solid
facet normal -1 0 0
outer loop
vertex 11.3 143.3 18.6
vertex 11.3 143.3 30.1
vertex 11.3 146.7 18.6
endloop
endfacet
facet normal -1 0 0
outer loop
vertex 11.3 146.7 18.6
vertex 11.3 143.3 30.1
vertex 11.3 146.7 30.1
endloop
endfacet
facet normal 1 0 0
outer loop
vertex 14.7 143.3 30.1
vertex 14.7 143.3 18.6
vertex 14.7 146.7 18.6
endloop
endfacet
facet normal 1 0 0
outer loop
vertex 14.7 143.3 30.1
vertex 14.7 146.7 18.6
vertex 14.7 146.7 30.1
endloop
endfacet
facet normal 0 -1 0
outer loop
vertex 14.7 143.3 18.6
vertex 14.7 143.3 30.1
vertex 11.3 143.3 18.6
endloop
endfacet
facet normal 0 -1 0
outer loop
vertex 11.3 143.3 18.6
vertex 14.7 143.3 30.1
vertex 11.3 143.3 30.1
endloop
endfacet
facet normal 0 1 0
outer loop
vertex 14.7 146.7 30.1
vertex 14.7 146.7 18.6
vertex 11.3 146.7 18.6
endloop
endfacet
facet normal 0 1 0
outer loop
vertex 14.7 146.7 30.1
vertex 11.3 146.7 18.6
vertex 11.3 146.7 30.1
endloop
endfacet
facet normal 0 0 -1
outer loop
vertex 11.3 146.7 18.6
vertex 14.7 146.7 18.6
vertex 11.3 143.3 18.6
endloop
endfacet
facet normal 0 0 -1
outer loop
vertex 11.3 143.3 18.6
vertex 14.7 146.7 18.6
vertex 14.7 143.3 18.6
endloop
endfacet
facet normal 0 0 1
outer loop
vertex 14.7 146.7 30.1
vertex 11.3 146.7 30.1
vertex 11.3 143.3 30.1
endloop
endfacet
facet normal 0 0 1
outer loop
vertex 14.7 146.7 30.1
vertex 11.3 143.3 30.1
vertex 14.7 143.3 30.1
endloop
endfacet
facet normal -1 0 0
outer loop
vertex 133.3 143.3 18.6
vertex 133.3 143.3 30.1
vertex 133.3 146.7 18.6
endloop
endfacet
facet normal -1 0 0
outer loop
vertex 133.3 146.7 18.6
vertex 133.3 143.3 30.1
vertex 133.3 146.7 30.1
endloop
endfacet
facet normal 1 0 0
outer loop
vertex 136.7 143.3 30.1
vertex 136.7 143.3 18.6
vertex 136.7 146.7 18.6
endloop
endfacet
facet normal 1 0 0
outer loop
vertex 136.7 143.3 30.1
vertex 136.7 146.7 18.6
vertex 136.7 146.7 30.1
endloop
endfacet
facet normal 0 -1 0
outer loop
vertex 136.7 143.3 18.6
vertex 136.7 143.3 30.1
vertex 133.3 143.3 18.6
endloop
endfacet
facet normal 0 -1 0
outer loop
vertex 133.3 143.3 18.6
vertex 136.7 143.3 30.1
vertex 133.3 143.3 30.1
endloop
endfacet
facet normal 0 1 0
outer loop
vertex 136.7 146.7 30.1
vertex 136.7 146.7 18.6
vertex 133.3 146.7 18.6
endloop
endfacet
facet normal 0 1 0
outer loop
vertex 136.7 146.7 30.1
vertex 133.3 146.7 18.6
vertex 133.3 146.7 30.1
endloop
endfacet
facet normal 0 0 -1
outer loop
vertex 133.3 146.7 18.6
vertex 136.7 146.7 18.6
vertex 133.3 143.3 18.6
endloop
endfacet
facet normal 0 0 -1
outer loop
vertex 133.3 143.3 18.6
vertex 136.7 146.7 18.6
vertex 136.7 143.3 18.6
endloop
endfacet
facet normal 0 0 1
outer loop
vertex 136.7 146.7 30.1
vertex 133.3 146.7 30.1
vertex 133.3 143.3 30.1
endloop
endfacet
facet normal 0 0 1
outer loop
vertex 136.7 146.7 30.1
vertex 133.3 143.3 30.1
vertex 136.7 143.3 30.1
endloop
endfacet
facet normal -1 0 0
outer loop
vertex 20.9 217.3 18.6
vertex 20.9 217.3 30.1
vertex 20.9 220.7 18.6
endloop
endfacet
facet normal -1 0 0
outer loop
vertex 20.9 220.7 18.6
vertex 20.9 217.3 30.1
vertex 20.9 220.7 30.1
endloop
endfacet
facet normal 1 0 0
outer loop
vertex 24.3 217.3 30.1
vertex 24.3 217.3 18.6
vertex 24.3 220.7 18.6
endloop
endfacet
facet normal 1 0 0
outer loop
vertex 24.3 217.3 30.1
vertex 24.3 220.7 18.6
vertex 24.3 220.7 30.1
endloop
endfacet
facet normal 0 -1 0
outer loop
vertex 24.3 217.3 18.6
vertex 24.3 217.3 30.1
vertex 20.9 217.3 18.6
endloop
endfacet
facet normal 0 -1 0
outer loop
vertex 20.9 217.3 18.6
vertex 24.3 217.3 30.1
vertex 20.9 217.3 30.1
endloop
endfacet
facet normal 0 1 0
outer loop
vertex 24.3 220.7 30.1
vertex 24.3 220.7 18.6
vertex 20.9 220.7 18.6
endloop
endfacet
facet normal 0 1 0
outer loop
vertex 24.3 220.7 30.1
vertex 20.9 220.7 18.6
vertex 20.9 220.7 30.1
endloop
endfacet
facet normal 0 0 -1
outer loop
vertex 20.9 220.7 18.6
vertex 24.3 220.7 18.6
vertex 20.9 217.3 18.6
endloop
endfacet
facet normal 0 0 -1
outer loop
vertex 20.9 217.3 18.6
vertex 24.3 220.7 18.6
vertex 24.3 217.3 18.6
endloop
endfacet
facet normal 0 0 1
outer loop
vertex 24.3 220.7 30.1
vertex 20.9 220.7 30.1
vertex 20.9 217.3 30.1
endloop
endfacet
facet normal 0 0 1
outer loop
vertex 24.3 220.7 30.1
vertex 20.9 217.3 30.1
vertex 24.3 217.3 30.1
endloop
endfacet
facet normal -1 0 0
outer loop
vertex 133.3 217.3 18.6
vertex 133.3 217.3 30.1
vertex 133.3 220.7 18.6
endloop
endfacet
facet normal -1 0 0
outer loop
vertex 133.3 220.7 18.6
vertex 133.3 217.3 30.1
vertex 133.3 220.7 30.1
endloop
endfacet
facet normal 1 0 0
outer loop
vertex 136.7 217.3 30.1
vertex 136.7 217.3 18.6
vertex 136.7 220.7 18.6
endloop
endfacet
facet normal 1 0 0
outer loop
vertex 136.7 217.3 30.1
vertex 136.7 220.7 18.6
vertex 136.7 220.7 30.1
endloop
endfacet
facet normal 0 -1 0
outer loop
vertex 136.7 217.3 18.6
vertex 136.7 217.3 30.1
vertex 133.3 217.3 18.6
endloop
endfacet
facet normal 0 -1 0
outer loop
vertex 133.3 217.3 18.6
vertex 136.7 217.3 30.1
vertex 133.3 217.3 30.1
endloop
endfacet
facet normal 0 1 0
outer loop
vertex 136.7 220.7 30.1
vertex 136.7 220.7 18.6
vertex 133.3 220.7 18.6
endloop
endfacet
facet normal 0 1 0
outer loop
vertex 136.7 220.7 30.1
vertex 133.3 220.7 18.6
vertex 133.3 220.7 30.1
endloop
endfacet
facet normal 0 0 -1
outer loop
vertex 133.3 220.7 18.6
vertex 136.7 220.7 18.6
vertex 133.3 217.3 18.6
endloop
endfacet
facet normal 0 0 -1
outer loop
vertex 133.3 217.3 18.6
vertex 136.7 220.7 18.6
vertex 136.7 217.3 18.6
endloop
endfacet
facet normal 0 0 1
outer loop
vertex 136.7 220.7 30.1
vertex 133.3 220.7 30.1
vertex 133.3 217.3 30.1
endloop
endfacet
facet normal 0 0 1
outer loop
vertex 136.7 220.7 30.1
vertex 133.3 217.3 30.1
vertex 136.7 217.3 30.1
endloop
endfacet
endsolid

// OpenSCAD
// Generated by the canonical parent Python sources and validated exchange pipeline.
polyhedron(points=[[11.300000190734863, 143.3000030517578, 18.600000381469727], [11.300000190734863, 143.3000030517578, 30.100000381469727], [11.300000190734863, 146.6999969482422, 18.600000381469727], [11.300000190734863, 146.6999969482422, 30.100000381469727], [14.699999809265137, 143.3000030517578, 30.100000381469727], [14.699999809265137, 143.3000030517578, 18.600000381469727], [14.699999809265137, 146.6999969482422, 18.600000381469727], [14.699999809265137, 146.6999969482422, 30.100000381469727], [133.3000030517578, 143.3000030517578, 18.600000381469727], [133.3000030517578, 143.3000030517578, 30.100000381469727], [133.3000030517578, 146.6999969482422, 18.600000381469727], [133.3000030517578, 146.6999969482422, 30.100000381469727], [136.6999969482422, 143.3000030517578, 30.100000381469727], [136.6999969482422, 143.3000030517578, 18.600000381469727], [136.6999969482422, 146.6999969482422, 18.600000381469727], [136.6999969482422, 146.6999969482422, 30.100000381469727], [20.899999618530273, 217.3000030517578, 18.600000381469727], [20.899999618530273, 217.3000030517578, 30.100000381469727], [20.899999618530273, 220.6999969482422, 18.600000381469727], [20.899999618530273, 220.6999969482422, 30.100000381469727], [24.299999237060547, 217.3000030517578, 30.100000381469727], [24.299999237060547, 217.3000030517578, 18.600000381469727], [24.299999237060547, 220.6999969482422, 18.600000381469727], [24.299999237060547, 220.6999969482422, 30.100000381469727], [133.3000030517578, 217.3000030517578, 18.600000381469727], [133.3000030517578, 217.3000030517578, 30.100000381469727], [133.3000030517578, 220.6999969482422, 18.600000381469727], [133.3000030517578, 220.6999969482422, 30.100000381469727], [136.6999969482422, 217.3000030517578, 30.100000381469727], [136.6999969482422, 217.3000030517578, 18.600000381469727], [136.6999969482422, 220.6999969482422, 18.600000381469727], [136.6999969482422, 220.6999969482422, 30.100000381469727]],faces=[[2, 1, 0], [3, 1, 2], [6, 5, 4], [7, 6, 4], [0, 4, 5], [1, 4, 0], [2, 6, 7], [3, 2, 7], [0, 6, 2], [5, 6, 0], [1, 3, 7], [4, 1, 7], [10, 9, 8], [11, 9, 10], [14, 13, 12], [15, 14, 12], [8, 12, 13], [9, 12, 8], [10, 14, 15], [11, 10, 15], [8, 14, 10], [13, 14, 8], [9, 11, 15], [12, 9, 15], [18, 17, 16], [19, 17, 18], [22, 21, 20], [23, 22, 20], [16, 20, 21], [17, 20, 16], [18, 22, 23], [19, 18, 23], [16, 22, 18], [21, 22, 16], [17, 19, 23], [20, 17, 23], [26, 25, 24], [27, 25, 26], [30, 29, 28], [31, 30, 28], [24, 28, 29], [25, 28, 24], [26, 30, 31], [27, 26, 31], [24, 30, 26], [29, 30, 24], [25, 27, 31], [28, 25, 31]],convexity=10);
